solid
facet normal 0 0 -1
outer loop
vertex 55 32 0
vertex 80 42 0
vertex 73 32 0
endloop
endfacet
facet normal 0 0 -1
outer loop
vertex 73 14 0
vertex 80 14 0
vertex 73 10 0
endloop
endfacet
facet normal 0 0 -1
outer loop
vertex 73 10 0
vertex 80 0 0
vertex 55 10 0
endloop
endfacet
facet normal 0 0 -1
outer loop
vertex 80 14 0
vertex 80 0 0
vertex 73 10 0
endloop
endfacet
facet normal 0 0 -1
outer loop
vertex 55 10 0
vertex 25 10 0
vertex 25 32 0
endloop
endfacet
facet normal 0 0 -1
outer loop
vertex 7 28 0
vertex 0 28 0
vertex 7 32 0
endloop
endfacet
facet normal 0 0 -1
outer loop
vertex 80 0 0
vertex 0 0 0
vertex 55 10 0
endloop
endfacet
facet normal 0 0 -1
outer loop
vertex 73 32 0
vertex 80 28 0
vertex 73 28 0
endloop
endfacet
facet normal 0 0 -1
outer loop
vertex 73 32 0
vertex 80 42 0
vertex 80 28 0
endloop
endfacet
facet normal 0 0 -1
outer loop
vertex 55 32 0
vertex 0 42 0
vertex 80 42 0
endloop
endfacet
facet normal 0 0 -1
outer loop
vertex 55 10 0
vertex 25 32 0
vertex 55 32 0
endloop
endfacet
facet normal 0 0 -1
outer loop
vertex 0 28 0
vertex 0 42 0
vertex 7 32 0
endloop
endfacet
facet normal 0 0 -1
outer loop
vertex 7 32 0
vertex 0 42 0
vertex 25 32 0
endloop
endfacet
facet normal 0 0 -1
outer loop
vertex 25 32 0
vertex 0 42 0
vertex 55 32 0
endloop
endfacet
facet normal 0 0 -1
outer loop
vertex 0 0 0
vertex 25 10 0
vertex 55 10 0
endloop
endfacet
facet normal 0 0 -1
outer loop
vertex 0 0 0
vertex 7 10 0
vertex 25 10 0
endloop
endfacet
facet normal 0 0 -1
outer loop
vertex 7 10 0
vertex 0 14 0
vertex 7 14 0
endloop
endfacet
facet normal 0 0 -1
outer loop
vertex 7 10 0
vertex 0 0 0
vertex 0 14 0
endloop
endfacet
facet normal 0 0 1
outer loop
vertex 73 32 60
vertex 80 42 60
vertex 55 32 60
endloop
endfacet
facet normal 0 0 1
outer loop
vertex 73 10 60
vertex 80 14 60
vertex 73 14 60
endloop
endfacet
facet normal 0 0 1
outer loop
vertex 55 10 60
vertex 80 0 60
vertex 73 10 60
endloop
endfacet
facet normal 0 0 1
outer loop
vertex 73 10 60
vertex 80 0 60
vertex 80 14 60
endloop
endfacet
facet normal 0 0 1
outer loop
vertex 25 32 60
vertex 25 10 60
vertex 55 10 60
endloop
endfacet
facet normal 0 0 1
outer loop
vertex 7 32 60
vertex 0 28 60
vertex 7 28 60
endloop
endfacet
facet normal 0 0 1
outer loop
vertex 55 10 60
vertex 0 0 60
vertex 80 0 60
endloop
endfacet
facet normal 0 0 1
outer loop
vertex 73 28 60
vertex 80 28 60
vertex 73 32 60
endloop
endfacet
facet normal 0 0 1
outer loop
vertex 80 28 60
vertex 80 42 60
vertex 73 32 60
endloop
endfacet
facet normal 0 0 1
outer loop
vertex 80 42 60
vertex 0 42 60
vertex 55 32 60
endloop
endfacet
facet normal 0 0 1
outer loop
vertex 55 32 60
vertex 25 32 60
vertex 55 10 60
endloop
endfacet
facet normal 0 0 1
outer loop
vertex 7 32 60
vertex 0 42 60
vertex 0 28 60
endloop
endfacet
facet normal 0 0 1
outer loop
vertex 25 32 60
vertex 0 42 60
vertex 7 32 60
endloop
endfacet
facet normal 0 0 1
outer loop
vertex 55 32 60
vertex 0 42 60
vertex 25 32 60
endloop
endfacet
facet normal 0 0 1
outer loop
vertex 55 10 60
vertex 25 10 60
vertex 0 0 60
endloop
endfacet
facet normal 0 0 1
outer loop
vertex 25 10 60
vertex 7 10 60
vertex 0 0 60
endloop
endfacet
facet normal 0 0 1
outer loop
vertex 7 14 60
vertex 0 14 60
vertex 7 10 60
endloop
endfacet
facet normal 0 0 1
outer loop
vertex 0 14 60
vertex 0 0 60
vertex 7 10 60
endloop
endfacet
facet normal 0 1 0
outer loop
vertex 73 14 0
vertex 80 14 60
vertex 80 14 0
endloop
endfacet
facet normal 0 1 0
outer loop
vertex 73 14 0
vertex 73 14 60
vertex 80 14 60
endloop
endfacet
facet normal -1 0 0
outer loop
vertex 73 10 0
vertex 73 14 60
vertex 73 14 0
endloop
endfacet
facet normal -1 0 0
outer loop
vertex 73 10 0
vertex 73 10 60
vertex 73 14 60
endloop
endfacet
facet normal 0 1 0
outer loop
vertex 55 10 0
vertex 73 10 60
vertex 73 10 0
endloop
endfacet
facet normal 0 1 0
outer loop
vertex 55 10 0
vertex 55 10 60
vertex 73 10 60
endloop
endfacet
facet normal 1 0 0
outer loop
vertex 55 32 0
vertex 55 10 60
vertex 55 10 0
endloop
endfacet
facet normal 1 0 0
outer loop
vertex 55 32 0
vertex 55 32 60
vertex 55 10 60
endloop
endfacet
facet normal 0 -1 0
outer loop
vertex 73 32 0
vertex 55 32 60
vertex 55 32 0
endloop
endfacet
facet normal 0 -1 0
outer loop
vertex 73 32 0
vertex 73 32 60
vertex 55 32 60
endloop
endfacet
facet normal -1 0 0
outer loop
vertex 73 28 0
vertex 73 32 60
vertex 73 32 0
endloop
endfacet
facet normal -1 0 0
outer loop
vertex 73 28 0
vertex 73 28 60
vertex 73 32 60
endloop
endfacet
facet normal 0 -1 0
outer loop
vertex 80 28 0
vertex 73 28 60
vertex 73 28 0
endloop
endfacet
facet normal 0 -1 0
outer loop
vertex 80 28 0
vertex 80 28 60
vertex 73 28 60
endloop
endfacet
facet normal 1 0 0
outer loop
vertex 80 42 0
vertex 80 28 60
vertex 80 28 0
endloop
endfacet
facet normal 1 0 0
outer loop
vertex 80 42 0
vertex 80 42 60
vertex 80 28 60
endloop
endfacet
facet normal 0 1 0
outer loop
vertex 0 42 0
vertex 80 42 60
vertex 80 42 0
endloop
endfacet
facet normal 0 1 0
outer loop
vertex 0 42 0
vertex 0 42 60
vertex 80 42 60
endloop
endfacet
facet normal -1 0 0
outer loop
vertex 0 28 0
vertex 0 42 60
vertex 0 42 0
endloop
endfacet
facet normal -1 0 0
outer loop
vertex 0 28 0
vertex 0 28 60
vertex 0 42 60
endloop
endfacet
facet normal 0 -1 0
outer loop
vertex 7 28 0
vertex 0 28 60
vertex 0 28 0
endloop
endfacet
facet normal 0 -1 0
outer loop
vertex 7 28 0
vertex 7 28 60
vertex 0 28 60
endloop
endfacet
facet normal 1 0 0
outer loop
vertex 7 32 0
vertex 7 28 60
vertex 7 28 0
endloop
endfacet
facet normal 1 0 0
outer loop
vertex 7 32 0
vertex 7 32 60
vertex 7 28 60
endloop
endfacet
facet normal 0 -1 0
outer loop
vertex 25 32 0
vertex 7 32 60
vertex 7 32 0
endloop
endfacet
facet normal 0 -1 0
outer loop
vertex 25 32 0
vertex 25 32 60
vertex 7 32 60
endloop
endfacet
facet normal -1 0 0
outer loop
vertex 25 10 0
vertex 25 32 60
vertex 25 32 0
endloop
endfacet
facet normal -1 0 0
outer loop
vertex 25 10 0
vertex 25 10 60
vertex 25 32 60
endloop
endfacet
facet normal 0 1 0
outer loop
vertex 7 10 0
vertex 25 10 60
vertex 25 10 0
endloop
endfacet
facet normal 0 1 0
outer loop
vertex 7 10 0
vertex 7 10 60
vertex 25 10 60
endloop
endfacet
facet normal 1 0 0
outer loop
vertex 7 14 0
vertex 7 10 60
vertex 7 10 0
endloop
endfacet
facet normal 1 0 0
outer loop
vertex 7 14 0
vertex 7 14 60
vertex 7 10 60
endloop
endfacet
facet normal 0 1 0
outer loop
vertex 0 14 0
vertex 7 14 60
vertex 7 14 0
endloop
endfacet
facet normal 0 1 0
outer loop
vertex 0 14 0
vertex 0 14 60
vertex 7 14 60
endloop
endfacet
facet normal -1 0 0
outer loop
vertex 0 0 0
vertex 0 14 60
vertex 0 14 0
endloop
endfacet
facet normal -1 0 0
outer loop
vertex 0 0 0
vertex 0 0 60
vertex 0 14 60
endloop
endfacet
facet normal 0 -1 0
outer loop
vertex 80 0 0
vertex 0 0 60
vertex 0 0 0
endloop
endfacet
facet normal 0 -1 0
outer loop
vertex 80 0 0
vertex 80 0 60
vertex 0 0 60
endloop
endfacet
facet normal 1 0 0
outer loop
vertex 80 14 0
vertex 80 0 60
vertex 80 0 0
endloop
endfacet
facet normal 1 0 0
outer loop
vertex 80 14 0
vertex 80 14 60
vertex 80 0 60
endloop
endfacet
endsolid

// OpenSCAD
$fn = 32;

// ----------------------------------------------------------------------
// T-slot rail: 80 x 42 mm section, 60 mm long
// ----------------------------------------------------------------------

// --- parameters (mm) ---
profile_height = 60;      // extrusion height
profile_points = 20;      // points of the closed outline

profile = [[0, 0], [80, 0], [80, 14], [73, 14], [73, 10], [55, 10], [55, 32], [73, 32], [73, 28], [80, 28], [80, 42], [0, 42], [0, 28], [7, 28], [7, 32], [25, 32], [25, 10], [7, 10], [7, 14], [0, 14]];  // single closed polygon, 20 points, counter clockwise

// --- the one profile operation ---
linear_extrude(height = profile_height) polygon(points = profile);
